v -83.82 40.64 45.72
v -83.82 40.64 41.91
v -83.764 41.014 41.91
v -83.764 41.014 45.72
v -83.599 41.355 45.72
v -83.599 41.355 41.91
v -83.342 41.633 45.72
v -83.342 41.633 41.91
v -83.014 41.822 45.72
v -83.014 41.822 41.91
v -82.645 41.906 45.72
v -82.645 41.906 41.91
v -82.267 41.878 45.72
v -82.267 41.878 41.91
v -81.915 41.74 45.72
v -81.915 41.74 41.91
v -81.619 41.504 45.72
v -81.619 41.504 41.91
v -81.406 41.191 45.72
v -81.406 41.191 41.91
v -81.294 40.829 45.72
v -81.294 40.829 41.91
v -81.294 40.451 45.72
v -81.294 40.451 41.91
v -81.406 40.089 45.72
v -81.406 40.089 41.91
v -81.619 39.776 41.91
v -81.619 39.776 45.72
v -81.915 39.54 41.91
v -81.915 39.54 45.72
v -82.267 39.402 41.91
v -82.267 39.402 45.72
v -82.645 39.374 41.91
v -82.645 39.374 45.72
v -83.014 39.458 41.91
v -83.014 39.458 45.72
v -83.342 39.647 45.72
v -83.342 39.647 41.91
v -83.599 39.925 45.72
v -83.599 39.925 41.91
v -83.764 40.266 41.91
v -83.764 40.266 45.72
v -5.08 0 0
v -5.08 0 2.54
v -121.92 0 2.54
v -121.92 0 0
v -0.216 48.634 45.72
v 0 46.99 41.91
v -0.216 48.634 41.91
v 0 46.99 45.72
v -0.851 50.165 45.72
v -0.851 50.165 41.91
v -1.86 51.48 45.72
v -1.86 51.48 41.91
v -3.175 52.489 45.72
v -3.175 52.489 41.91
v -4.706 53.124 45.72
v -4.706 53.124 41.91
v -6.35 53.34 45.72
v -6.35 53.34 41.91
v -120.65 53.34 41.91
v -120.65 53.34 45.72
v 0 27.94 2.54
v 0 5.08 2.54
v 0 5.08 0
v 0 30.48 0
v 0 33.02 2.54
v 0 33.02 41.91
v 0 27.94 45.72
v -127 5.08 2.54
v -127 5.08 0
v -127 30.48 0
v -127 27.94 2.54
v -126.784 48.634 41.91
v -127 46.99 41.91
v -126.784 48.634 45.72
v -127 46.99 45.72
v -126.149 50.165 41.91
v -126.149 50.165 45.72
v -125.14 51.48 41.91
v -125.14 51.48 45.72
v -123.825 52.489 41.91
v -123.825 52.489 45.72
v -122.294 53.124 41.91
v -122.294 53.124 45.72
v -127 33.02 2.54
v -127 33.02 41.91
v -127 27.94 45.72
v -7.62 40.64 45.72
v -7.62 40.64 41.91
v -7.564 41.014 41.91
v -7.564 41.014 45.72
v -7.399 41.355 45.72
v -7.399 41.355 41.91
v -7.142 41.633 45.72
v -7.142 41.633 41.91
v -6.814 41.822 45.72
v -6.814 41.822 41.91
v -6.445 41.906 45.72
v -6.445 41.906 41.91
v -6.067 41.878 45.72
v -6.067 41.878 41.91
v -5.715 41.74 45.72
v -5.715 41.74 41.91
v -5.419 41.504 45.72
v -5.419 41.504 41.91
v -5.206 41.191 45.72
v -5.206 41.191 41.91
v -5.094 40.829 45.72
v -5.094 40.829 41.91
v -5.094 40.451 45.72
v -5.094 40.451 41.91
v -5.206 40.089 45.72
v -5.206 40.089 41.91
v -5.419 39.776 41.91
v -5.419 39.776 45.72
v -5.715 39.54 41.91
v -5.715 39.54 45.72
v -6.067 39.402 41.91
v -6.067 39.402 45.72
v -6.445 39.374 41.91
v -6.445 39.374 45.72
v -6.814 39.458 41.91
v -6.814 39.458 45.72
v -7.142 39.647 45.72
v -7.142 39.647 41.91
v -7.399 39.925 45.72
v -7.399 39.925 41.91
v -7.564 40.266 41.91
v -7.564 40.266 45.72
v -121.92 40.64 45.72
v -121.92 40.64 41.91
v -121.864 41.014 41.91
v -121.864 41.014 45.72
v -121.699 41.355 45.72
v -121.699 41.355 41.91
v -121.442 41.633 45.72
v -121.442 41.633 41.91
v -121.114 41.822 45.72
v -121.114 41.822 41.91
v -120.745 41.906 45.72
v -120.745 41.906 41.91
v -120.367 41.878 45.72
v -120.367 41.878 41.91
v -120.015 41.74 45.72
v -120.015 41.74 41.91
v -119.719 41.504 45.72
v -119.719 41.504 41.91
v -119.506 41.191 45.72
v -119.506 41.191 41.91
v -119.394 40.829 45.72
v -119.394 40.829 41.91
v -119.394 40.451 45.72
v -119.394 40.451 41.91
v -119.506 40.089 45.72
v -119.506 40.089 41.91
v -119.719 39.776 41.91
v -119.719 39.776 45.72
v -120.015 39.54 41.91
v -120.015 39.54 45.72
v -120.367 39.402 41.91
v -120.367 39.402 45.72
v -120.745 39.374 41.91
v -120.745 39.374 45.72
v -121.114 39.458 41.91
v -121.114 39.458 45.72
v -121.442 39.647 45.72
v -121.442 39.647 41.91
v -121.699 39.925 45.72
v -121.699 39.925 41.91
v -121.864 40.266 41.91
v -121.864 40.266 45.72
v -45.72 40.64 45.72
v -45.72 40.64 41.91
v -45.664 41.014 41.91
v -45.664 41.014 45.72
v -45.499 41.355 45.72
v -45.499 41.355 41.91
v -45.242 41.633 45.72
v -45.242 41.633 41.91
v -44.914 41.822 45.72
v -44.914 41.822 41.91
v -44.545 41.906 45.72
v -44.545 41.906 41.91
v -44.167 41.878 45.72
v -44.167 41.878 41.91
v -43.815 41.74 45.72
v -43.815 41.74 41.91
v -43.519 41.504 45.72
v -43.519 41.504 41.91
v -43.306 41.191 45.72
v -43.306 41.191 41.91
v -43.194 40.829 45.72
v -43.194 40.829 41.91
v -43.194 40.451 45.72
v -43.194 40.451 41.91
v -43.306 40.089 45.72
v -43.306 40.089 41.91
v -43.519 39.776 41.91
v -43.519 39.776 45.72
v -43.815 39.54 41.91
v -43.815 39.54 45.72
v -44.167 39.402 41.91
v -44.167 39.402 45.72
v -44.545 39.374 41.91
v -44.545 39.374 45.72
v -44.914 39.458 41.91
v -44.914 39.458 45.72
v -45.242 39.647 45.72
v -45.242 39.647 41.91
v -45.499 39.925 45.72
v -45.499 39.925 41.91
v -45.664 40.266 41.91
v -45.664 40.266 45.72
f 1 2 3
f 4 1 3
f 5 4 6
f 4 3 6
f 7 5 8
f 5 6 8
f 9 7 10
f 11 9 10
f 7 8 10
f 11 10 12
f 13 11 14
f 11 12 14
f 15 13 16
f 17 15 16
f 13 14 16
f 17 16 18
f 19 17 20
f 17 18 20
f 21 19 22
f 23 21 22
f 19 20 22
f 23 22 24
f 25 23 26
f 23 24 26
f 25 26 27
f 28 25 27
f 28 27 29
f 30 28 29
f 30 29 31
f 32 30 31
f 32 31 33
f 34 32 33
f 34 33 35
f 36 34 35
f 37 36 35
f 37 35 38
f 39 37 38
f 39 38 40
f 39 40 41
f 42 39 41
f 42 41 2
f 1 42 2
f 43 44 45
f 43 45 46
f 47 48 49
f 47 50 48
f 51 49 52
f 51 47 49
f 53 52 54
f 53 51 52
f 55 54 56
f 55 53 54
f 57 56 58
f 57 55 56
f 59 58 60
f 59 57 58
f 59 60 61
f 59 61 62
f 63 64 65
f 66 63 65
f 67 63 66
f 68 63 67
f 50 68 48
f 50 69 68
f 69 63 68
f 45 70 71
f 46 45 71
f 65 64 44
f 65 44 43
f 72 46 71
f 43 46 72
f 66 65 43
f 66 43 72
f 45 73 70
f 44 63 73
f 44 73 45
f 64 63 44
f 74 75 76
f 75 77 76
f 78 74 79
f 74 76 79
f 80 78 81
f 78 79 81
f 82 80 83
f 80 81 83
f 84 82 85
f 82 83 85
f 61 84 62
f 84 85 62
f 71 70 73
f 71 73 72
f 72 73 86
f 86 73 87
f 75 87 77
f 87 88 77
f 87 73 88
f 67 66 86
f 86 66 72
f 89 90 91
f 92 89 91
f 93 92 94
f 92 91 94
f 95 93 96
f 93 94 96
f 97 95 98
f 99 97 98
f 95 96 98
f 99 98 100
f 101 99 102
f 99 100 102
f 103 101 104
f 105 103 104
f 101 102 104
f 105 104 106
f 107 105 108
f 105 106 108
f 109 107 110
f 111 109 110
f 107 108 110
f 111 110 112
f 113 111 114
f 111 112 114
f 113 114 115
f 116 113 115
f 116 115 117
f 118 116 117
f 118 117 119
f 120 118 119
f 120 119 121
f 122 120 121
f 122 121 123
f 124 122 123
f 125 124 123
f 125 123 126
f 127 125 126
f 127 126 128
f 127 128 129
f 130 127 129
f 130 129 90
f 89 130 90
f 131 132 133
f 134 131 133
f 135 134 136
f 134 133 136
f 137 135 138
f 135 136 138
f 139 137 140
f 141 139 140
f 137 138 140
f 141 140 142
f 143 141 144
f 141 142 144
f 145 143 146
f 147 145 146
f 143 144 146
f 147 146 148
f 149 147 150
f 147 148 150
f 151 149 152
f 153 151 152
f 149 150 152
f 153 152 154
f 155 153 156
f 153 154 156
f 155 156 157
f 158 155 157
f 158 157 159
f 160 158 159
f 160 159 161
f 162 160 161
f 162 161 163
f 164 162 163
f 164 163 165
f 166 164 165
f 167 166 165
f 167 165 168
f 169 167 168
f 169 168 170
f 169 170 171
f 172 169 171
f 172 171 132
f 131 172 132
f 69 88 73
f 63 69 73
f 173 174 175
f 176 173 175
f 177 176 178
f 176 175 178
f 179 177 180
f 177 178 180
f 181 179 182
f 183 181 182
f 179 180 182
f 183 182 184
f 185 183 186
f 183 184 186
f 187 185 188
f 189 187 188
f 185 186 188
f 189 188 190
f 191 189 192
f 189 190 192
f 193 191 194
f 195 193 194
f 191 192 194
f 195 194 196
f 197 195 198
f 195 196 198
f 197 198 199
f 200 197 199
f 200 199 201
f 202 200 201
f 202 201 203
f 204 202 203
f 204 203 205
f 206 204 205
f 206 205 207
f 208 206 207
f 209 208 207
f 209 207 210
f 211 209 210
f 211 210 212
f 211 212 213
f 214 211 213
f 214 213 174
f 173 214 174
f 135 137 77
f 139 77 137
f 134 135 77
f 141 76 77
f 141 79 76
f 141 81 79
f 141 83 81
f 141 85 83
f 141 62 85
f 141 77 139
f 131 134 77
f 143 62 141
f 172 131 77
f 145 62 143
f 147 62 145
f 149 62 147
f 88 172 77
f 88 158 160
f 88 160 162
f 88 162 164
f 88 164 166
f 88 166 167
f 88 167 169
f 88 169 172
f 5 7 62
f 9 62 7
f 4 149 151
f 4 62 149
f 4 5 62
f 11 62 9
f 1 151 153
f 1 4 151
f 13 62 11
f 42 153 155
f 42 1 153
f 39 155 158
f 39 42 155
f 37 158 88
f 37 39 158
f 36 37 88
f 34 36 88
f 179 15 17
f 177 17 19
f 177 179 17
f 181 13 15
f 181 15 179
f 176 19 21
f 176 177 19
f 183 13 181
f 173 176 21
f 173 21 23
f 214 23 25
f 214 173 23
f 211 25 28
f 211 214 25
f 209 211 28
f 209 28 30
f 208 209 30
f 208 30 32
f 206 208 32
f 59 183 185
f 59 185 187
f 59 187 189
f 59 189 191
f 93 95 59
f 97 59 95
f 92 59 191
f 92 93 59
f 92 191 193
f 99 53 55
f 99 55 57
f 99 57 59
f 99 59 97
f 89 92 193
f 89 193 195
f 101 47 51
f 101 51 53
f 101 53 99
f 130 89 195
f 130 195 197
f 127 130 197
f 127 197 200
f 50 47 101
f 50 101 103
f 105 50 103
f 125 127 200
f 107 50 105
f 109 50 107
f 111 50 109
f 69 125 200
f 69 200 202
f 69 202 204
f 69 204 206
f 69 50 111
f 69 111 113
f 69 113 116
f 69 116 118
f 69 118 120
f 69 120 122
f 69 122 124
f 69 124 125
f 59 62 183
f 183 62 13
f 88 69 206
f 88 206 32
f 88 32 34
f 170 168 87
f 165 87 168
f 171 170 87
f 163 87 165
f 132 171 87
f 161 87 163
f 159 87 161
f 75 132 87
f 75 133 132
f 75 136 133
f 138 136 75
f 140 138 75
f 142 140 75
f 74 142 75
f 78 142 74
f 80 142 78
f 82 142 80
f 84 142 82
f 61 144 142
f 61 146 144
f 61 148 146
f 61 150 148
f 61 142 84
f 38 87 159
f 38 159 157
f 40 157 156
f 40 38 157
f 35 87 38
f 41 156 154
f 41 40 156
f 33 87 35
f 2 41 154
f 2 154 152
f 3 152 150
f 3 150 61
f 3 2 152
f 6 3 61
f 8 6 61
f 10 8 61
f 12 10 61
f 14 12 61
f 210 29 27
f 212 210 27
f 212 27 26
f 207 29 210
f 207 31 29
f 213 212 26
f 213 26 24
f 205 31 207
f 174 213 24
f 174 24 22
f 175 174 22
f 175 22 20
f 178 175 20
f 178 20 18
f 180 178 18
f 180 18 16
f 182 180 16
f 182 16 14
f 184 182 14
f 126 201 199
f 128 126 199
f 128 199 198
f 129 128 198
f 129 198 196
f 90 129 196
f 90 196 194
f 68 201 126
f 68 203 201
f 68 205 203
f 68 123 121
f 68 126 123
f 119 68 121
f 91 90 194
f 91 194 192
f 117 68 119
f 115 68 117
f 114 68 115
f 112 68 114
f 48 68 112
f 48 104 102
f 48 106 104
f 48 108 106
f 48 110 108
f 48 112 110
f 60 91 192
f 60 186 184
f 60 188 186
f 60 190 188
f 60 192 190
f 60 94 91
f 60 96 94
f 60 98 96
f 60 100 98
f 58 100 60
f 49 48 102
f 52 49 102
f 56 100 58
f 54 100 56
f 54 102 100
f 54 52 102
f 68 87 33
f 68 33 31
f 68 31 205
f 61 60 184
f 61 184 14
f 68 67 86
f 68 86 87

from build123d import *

# Parameters (mm, degrees)
F1_DEPTH = 127
F2_SIZE  = 5.08
F4_D     = 2.54
F5_R     = 6.35
F6_SIZE  = 2.54


with BuildPart() as f1:
    # F0 (on Right) → F1 (new body)
    with BuildSketch(Plane.YZ):
        Polygon((0, 2.54), (0, 0), (33.02, 0), (33.02, 41.91), (53.34, 41.91), (53.34, 45.72), (27.94, 45.72), (27.94, 2.54), align=None)
    extrude(amount=-F1_DEPTH)

    # F2
    f2_edges = [f1.edges().sort_by_distance(p)[0] for p in [
        (0, 0, 1.27),
        (-127, 0, 1.27),
    ]]
    chamfer(f2_edges, length=F2_SIZE)

    # F4 (through all)
    with Locations(Plane.XY.offset(45.72)):
        with Locations((-120.65, 40.64), (-82.55, 40.64), (-44.45, 40.64), (-6.35, 40.64)):
            Hole(F4_D / 2)

    # F5
    f5_edges = [f1.edges().sort_by_distance(p)[0] for p in [
        (0, 53.34, 43.815),
        (-127, 53.34, 43.815),
    ]]
    fillet(f5_edges, radius=F5_R)

    # F6
    f6_edges = [f1.edges().sort_by_distance(p)[0] for p in [
        (-63.5, 33.02, 0),
    ]]
    chamfer(f6_edges, length=F6_SIZE)


solid = f1.part
